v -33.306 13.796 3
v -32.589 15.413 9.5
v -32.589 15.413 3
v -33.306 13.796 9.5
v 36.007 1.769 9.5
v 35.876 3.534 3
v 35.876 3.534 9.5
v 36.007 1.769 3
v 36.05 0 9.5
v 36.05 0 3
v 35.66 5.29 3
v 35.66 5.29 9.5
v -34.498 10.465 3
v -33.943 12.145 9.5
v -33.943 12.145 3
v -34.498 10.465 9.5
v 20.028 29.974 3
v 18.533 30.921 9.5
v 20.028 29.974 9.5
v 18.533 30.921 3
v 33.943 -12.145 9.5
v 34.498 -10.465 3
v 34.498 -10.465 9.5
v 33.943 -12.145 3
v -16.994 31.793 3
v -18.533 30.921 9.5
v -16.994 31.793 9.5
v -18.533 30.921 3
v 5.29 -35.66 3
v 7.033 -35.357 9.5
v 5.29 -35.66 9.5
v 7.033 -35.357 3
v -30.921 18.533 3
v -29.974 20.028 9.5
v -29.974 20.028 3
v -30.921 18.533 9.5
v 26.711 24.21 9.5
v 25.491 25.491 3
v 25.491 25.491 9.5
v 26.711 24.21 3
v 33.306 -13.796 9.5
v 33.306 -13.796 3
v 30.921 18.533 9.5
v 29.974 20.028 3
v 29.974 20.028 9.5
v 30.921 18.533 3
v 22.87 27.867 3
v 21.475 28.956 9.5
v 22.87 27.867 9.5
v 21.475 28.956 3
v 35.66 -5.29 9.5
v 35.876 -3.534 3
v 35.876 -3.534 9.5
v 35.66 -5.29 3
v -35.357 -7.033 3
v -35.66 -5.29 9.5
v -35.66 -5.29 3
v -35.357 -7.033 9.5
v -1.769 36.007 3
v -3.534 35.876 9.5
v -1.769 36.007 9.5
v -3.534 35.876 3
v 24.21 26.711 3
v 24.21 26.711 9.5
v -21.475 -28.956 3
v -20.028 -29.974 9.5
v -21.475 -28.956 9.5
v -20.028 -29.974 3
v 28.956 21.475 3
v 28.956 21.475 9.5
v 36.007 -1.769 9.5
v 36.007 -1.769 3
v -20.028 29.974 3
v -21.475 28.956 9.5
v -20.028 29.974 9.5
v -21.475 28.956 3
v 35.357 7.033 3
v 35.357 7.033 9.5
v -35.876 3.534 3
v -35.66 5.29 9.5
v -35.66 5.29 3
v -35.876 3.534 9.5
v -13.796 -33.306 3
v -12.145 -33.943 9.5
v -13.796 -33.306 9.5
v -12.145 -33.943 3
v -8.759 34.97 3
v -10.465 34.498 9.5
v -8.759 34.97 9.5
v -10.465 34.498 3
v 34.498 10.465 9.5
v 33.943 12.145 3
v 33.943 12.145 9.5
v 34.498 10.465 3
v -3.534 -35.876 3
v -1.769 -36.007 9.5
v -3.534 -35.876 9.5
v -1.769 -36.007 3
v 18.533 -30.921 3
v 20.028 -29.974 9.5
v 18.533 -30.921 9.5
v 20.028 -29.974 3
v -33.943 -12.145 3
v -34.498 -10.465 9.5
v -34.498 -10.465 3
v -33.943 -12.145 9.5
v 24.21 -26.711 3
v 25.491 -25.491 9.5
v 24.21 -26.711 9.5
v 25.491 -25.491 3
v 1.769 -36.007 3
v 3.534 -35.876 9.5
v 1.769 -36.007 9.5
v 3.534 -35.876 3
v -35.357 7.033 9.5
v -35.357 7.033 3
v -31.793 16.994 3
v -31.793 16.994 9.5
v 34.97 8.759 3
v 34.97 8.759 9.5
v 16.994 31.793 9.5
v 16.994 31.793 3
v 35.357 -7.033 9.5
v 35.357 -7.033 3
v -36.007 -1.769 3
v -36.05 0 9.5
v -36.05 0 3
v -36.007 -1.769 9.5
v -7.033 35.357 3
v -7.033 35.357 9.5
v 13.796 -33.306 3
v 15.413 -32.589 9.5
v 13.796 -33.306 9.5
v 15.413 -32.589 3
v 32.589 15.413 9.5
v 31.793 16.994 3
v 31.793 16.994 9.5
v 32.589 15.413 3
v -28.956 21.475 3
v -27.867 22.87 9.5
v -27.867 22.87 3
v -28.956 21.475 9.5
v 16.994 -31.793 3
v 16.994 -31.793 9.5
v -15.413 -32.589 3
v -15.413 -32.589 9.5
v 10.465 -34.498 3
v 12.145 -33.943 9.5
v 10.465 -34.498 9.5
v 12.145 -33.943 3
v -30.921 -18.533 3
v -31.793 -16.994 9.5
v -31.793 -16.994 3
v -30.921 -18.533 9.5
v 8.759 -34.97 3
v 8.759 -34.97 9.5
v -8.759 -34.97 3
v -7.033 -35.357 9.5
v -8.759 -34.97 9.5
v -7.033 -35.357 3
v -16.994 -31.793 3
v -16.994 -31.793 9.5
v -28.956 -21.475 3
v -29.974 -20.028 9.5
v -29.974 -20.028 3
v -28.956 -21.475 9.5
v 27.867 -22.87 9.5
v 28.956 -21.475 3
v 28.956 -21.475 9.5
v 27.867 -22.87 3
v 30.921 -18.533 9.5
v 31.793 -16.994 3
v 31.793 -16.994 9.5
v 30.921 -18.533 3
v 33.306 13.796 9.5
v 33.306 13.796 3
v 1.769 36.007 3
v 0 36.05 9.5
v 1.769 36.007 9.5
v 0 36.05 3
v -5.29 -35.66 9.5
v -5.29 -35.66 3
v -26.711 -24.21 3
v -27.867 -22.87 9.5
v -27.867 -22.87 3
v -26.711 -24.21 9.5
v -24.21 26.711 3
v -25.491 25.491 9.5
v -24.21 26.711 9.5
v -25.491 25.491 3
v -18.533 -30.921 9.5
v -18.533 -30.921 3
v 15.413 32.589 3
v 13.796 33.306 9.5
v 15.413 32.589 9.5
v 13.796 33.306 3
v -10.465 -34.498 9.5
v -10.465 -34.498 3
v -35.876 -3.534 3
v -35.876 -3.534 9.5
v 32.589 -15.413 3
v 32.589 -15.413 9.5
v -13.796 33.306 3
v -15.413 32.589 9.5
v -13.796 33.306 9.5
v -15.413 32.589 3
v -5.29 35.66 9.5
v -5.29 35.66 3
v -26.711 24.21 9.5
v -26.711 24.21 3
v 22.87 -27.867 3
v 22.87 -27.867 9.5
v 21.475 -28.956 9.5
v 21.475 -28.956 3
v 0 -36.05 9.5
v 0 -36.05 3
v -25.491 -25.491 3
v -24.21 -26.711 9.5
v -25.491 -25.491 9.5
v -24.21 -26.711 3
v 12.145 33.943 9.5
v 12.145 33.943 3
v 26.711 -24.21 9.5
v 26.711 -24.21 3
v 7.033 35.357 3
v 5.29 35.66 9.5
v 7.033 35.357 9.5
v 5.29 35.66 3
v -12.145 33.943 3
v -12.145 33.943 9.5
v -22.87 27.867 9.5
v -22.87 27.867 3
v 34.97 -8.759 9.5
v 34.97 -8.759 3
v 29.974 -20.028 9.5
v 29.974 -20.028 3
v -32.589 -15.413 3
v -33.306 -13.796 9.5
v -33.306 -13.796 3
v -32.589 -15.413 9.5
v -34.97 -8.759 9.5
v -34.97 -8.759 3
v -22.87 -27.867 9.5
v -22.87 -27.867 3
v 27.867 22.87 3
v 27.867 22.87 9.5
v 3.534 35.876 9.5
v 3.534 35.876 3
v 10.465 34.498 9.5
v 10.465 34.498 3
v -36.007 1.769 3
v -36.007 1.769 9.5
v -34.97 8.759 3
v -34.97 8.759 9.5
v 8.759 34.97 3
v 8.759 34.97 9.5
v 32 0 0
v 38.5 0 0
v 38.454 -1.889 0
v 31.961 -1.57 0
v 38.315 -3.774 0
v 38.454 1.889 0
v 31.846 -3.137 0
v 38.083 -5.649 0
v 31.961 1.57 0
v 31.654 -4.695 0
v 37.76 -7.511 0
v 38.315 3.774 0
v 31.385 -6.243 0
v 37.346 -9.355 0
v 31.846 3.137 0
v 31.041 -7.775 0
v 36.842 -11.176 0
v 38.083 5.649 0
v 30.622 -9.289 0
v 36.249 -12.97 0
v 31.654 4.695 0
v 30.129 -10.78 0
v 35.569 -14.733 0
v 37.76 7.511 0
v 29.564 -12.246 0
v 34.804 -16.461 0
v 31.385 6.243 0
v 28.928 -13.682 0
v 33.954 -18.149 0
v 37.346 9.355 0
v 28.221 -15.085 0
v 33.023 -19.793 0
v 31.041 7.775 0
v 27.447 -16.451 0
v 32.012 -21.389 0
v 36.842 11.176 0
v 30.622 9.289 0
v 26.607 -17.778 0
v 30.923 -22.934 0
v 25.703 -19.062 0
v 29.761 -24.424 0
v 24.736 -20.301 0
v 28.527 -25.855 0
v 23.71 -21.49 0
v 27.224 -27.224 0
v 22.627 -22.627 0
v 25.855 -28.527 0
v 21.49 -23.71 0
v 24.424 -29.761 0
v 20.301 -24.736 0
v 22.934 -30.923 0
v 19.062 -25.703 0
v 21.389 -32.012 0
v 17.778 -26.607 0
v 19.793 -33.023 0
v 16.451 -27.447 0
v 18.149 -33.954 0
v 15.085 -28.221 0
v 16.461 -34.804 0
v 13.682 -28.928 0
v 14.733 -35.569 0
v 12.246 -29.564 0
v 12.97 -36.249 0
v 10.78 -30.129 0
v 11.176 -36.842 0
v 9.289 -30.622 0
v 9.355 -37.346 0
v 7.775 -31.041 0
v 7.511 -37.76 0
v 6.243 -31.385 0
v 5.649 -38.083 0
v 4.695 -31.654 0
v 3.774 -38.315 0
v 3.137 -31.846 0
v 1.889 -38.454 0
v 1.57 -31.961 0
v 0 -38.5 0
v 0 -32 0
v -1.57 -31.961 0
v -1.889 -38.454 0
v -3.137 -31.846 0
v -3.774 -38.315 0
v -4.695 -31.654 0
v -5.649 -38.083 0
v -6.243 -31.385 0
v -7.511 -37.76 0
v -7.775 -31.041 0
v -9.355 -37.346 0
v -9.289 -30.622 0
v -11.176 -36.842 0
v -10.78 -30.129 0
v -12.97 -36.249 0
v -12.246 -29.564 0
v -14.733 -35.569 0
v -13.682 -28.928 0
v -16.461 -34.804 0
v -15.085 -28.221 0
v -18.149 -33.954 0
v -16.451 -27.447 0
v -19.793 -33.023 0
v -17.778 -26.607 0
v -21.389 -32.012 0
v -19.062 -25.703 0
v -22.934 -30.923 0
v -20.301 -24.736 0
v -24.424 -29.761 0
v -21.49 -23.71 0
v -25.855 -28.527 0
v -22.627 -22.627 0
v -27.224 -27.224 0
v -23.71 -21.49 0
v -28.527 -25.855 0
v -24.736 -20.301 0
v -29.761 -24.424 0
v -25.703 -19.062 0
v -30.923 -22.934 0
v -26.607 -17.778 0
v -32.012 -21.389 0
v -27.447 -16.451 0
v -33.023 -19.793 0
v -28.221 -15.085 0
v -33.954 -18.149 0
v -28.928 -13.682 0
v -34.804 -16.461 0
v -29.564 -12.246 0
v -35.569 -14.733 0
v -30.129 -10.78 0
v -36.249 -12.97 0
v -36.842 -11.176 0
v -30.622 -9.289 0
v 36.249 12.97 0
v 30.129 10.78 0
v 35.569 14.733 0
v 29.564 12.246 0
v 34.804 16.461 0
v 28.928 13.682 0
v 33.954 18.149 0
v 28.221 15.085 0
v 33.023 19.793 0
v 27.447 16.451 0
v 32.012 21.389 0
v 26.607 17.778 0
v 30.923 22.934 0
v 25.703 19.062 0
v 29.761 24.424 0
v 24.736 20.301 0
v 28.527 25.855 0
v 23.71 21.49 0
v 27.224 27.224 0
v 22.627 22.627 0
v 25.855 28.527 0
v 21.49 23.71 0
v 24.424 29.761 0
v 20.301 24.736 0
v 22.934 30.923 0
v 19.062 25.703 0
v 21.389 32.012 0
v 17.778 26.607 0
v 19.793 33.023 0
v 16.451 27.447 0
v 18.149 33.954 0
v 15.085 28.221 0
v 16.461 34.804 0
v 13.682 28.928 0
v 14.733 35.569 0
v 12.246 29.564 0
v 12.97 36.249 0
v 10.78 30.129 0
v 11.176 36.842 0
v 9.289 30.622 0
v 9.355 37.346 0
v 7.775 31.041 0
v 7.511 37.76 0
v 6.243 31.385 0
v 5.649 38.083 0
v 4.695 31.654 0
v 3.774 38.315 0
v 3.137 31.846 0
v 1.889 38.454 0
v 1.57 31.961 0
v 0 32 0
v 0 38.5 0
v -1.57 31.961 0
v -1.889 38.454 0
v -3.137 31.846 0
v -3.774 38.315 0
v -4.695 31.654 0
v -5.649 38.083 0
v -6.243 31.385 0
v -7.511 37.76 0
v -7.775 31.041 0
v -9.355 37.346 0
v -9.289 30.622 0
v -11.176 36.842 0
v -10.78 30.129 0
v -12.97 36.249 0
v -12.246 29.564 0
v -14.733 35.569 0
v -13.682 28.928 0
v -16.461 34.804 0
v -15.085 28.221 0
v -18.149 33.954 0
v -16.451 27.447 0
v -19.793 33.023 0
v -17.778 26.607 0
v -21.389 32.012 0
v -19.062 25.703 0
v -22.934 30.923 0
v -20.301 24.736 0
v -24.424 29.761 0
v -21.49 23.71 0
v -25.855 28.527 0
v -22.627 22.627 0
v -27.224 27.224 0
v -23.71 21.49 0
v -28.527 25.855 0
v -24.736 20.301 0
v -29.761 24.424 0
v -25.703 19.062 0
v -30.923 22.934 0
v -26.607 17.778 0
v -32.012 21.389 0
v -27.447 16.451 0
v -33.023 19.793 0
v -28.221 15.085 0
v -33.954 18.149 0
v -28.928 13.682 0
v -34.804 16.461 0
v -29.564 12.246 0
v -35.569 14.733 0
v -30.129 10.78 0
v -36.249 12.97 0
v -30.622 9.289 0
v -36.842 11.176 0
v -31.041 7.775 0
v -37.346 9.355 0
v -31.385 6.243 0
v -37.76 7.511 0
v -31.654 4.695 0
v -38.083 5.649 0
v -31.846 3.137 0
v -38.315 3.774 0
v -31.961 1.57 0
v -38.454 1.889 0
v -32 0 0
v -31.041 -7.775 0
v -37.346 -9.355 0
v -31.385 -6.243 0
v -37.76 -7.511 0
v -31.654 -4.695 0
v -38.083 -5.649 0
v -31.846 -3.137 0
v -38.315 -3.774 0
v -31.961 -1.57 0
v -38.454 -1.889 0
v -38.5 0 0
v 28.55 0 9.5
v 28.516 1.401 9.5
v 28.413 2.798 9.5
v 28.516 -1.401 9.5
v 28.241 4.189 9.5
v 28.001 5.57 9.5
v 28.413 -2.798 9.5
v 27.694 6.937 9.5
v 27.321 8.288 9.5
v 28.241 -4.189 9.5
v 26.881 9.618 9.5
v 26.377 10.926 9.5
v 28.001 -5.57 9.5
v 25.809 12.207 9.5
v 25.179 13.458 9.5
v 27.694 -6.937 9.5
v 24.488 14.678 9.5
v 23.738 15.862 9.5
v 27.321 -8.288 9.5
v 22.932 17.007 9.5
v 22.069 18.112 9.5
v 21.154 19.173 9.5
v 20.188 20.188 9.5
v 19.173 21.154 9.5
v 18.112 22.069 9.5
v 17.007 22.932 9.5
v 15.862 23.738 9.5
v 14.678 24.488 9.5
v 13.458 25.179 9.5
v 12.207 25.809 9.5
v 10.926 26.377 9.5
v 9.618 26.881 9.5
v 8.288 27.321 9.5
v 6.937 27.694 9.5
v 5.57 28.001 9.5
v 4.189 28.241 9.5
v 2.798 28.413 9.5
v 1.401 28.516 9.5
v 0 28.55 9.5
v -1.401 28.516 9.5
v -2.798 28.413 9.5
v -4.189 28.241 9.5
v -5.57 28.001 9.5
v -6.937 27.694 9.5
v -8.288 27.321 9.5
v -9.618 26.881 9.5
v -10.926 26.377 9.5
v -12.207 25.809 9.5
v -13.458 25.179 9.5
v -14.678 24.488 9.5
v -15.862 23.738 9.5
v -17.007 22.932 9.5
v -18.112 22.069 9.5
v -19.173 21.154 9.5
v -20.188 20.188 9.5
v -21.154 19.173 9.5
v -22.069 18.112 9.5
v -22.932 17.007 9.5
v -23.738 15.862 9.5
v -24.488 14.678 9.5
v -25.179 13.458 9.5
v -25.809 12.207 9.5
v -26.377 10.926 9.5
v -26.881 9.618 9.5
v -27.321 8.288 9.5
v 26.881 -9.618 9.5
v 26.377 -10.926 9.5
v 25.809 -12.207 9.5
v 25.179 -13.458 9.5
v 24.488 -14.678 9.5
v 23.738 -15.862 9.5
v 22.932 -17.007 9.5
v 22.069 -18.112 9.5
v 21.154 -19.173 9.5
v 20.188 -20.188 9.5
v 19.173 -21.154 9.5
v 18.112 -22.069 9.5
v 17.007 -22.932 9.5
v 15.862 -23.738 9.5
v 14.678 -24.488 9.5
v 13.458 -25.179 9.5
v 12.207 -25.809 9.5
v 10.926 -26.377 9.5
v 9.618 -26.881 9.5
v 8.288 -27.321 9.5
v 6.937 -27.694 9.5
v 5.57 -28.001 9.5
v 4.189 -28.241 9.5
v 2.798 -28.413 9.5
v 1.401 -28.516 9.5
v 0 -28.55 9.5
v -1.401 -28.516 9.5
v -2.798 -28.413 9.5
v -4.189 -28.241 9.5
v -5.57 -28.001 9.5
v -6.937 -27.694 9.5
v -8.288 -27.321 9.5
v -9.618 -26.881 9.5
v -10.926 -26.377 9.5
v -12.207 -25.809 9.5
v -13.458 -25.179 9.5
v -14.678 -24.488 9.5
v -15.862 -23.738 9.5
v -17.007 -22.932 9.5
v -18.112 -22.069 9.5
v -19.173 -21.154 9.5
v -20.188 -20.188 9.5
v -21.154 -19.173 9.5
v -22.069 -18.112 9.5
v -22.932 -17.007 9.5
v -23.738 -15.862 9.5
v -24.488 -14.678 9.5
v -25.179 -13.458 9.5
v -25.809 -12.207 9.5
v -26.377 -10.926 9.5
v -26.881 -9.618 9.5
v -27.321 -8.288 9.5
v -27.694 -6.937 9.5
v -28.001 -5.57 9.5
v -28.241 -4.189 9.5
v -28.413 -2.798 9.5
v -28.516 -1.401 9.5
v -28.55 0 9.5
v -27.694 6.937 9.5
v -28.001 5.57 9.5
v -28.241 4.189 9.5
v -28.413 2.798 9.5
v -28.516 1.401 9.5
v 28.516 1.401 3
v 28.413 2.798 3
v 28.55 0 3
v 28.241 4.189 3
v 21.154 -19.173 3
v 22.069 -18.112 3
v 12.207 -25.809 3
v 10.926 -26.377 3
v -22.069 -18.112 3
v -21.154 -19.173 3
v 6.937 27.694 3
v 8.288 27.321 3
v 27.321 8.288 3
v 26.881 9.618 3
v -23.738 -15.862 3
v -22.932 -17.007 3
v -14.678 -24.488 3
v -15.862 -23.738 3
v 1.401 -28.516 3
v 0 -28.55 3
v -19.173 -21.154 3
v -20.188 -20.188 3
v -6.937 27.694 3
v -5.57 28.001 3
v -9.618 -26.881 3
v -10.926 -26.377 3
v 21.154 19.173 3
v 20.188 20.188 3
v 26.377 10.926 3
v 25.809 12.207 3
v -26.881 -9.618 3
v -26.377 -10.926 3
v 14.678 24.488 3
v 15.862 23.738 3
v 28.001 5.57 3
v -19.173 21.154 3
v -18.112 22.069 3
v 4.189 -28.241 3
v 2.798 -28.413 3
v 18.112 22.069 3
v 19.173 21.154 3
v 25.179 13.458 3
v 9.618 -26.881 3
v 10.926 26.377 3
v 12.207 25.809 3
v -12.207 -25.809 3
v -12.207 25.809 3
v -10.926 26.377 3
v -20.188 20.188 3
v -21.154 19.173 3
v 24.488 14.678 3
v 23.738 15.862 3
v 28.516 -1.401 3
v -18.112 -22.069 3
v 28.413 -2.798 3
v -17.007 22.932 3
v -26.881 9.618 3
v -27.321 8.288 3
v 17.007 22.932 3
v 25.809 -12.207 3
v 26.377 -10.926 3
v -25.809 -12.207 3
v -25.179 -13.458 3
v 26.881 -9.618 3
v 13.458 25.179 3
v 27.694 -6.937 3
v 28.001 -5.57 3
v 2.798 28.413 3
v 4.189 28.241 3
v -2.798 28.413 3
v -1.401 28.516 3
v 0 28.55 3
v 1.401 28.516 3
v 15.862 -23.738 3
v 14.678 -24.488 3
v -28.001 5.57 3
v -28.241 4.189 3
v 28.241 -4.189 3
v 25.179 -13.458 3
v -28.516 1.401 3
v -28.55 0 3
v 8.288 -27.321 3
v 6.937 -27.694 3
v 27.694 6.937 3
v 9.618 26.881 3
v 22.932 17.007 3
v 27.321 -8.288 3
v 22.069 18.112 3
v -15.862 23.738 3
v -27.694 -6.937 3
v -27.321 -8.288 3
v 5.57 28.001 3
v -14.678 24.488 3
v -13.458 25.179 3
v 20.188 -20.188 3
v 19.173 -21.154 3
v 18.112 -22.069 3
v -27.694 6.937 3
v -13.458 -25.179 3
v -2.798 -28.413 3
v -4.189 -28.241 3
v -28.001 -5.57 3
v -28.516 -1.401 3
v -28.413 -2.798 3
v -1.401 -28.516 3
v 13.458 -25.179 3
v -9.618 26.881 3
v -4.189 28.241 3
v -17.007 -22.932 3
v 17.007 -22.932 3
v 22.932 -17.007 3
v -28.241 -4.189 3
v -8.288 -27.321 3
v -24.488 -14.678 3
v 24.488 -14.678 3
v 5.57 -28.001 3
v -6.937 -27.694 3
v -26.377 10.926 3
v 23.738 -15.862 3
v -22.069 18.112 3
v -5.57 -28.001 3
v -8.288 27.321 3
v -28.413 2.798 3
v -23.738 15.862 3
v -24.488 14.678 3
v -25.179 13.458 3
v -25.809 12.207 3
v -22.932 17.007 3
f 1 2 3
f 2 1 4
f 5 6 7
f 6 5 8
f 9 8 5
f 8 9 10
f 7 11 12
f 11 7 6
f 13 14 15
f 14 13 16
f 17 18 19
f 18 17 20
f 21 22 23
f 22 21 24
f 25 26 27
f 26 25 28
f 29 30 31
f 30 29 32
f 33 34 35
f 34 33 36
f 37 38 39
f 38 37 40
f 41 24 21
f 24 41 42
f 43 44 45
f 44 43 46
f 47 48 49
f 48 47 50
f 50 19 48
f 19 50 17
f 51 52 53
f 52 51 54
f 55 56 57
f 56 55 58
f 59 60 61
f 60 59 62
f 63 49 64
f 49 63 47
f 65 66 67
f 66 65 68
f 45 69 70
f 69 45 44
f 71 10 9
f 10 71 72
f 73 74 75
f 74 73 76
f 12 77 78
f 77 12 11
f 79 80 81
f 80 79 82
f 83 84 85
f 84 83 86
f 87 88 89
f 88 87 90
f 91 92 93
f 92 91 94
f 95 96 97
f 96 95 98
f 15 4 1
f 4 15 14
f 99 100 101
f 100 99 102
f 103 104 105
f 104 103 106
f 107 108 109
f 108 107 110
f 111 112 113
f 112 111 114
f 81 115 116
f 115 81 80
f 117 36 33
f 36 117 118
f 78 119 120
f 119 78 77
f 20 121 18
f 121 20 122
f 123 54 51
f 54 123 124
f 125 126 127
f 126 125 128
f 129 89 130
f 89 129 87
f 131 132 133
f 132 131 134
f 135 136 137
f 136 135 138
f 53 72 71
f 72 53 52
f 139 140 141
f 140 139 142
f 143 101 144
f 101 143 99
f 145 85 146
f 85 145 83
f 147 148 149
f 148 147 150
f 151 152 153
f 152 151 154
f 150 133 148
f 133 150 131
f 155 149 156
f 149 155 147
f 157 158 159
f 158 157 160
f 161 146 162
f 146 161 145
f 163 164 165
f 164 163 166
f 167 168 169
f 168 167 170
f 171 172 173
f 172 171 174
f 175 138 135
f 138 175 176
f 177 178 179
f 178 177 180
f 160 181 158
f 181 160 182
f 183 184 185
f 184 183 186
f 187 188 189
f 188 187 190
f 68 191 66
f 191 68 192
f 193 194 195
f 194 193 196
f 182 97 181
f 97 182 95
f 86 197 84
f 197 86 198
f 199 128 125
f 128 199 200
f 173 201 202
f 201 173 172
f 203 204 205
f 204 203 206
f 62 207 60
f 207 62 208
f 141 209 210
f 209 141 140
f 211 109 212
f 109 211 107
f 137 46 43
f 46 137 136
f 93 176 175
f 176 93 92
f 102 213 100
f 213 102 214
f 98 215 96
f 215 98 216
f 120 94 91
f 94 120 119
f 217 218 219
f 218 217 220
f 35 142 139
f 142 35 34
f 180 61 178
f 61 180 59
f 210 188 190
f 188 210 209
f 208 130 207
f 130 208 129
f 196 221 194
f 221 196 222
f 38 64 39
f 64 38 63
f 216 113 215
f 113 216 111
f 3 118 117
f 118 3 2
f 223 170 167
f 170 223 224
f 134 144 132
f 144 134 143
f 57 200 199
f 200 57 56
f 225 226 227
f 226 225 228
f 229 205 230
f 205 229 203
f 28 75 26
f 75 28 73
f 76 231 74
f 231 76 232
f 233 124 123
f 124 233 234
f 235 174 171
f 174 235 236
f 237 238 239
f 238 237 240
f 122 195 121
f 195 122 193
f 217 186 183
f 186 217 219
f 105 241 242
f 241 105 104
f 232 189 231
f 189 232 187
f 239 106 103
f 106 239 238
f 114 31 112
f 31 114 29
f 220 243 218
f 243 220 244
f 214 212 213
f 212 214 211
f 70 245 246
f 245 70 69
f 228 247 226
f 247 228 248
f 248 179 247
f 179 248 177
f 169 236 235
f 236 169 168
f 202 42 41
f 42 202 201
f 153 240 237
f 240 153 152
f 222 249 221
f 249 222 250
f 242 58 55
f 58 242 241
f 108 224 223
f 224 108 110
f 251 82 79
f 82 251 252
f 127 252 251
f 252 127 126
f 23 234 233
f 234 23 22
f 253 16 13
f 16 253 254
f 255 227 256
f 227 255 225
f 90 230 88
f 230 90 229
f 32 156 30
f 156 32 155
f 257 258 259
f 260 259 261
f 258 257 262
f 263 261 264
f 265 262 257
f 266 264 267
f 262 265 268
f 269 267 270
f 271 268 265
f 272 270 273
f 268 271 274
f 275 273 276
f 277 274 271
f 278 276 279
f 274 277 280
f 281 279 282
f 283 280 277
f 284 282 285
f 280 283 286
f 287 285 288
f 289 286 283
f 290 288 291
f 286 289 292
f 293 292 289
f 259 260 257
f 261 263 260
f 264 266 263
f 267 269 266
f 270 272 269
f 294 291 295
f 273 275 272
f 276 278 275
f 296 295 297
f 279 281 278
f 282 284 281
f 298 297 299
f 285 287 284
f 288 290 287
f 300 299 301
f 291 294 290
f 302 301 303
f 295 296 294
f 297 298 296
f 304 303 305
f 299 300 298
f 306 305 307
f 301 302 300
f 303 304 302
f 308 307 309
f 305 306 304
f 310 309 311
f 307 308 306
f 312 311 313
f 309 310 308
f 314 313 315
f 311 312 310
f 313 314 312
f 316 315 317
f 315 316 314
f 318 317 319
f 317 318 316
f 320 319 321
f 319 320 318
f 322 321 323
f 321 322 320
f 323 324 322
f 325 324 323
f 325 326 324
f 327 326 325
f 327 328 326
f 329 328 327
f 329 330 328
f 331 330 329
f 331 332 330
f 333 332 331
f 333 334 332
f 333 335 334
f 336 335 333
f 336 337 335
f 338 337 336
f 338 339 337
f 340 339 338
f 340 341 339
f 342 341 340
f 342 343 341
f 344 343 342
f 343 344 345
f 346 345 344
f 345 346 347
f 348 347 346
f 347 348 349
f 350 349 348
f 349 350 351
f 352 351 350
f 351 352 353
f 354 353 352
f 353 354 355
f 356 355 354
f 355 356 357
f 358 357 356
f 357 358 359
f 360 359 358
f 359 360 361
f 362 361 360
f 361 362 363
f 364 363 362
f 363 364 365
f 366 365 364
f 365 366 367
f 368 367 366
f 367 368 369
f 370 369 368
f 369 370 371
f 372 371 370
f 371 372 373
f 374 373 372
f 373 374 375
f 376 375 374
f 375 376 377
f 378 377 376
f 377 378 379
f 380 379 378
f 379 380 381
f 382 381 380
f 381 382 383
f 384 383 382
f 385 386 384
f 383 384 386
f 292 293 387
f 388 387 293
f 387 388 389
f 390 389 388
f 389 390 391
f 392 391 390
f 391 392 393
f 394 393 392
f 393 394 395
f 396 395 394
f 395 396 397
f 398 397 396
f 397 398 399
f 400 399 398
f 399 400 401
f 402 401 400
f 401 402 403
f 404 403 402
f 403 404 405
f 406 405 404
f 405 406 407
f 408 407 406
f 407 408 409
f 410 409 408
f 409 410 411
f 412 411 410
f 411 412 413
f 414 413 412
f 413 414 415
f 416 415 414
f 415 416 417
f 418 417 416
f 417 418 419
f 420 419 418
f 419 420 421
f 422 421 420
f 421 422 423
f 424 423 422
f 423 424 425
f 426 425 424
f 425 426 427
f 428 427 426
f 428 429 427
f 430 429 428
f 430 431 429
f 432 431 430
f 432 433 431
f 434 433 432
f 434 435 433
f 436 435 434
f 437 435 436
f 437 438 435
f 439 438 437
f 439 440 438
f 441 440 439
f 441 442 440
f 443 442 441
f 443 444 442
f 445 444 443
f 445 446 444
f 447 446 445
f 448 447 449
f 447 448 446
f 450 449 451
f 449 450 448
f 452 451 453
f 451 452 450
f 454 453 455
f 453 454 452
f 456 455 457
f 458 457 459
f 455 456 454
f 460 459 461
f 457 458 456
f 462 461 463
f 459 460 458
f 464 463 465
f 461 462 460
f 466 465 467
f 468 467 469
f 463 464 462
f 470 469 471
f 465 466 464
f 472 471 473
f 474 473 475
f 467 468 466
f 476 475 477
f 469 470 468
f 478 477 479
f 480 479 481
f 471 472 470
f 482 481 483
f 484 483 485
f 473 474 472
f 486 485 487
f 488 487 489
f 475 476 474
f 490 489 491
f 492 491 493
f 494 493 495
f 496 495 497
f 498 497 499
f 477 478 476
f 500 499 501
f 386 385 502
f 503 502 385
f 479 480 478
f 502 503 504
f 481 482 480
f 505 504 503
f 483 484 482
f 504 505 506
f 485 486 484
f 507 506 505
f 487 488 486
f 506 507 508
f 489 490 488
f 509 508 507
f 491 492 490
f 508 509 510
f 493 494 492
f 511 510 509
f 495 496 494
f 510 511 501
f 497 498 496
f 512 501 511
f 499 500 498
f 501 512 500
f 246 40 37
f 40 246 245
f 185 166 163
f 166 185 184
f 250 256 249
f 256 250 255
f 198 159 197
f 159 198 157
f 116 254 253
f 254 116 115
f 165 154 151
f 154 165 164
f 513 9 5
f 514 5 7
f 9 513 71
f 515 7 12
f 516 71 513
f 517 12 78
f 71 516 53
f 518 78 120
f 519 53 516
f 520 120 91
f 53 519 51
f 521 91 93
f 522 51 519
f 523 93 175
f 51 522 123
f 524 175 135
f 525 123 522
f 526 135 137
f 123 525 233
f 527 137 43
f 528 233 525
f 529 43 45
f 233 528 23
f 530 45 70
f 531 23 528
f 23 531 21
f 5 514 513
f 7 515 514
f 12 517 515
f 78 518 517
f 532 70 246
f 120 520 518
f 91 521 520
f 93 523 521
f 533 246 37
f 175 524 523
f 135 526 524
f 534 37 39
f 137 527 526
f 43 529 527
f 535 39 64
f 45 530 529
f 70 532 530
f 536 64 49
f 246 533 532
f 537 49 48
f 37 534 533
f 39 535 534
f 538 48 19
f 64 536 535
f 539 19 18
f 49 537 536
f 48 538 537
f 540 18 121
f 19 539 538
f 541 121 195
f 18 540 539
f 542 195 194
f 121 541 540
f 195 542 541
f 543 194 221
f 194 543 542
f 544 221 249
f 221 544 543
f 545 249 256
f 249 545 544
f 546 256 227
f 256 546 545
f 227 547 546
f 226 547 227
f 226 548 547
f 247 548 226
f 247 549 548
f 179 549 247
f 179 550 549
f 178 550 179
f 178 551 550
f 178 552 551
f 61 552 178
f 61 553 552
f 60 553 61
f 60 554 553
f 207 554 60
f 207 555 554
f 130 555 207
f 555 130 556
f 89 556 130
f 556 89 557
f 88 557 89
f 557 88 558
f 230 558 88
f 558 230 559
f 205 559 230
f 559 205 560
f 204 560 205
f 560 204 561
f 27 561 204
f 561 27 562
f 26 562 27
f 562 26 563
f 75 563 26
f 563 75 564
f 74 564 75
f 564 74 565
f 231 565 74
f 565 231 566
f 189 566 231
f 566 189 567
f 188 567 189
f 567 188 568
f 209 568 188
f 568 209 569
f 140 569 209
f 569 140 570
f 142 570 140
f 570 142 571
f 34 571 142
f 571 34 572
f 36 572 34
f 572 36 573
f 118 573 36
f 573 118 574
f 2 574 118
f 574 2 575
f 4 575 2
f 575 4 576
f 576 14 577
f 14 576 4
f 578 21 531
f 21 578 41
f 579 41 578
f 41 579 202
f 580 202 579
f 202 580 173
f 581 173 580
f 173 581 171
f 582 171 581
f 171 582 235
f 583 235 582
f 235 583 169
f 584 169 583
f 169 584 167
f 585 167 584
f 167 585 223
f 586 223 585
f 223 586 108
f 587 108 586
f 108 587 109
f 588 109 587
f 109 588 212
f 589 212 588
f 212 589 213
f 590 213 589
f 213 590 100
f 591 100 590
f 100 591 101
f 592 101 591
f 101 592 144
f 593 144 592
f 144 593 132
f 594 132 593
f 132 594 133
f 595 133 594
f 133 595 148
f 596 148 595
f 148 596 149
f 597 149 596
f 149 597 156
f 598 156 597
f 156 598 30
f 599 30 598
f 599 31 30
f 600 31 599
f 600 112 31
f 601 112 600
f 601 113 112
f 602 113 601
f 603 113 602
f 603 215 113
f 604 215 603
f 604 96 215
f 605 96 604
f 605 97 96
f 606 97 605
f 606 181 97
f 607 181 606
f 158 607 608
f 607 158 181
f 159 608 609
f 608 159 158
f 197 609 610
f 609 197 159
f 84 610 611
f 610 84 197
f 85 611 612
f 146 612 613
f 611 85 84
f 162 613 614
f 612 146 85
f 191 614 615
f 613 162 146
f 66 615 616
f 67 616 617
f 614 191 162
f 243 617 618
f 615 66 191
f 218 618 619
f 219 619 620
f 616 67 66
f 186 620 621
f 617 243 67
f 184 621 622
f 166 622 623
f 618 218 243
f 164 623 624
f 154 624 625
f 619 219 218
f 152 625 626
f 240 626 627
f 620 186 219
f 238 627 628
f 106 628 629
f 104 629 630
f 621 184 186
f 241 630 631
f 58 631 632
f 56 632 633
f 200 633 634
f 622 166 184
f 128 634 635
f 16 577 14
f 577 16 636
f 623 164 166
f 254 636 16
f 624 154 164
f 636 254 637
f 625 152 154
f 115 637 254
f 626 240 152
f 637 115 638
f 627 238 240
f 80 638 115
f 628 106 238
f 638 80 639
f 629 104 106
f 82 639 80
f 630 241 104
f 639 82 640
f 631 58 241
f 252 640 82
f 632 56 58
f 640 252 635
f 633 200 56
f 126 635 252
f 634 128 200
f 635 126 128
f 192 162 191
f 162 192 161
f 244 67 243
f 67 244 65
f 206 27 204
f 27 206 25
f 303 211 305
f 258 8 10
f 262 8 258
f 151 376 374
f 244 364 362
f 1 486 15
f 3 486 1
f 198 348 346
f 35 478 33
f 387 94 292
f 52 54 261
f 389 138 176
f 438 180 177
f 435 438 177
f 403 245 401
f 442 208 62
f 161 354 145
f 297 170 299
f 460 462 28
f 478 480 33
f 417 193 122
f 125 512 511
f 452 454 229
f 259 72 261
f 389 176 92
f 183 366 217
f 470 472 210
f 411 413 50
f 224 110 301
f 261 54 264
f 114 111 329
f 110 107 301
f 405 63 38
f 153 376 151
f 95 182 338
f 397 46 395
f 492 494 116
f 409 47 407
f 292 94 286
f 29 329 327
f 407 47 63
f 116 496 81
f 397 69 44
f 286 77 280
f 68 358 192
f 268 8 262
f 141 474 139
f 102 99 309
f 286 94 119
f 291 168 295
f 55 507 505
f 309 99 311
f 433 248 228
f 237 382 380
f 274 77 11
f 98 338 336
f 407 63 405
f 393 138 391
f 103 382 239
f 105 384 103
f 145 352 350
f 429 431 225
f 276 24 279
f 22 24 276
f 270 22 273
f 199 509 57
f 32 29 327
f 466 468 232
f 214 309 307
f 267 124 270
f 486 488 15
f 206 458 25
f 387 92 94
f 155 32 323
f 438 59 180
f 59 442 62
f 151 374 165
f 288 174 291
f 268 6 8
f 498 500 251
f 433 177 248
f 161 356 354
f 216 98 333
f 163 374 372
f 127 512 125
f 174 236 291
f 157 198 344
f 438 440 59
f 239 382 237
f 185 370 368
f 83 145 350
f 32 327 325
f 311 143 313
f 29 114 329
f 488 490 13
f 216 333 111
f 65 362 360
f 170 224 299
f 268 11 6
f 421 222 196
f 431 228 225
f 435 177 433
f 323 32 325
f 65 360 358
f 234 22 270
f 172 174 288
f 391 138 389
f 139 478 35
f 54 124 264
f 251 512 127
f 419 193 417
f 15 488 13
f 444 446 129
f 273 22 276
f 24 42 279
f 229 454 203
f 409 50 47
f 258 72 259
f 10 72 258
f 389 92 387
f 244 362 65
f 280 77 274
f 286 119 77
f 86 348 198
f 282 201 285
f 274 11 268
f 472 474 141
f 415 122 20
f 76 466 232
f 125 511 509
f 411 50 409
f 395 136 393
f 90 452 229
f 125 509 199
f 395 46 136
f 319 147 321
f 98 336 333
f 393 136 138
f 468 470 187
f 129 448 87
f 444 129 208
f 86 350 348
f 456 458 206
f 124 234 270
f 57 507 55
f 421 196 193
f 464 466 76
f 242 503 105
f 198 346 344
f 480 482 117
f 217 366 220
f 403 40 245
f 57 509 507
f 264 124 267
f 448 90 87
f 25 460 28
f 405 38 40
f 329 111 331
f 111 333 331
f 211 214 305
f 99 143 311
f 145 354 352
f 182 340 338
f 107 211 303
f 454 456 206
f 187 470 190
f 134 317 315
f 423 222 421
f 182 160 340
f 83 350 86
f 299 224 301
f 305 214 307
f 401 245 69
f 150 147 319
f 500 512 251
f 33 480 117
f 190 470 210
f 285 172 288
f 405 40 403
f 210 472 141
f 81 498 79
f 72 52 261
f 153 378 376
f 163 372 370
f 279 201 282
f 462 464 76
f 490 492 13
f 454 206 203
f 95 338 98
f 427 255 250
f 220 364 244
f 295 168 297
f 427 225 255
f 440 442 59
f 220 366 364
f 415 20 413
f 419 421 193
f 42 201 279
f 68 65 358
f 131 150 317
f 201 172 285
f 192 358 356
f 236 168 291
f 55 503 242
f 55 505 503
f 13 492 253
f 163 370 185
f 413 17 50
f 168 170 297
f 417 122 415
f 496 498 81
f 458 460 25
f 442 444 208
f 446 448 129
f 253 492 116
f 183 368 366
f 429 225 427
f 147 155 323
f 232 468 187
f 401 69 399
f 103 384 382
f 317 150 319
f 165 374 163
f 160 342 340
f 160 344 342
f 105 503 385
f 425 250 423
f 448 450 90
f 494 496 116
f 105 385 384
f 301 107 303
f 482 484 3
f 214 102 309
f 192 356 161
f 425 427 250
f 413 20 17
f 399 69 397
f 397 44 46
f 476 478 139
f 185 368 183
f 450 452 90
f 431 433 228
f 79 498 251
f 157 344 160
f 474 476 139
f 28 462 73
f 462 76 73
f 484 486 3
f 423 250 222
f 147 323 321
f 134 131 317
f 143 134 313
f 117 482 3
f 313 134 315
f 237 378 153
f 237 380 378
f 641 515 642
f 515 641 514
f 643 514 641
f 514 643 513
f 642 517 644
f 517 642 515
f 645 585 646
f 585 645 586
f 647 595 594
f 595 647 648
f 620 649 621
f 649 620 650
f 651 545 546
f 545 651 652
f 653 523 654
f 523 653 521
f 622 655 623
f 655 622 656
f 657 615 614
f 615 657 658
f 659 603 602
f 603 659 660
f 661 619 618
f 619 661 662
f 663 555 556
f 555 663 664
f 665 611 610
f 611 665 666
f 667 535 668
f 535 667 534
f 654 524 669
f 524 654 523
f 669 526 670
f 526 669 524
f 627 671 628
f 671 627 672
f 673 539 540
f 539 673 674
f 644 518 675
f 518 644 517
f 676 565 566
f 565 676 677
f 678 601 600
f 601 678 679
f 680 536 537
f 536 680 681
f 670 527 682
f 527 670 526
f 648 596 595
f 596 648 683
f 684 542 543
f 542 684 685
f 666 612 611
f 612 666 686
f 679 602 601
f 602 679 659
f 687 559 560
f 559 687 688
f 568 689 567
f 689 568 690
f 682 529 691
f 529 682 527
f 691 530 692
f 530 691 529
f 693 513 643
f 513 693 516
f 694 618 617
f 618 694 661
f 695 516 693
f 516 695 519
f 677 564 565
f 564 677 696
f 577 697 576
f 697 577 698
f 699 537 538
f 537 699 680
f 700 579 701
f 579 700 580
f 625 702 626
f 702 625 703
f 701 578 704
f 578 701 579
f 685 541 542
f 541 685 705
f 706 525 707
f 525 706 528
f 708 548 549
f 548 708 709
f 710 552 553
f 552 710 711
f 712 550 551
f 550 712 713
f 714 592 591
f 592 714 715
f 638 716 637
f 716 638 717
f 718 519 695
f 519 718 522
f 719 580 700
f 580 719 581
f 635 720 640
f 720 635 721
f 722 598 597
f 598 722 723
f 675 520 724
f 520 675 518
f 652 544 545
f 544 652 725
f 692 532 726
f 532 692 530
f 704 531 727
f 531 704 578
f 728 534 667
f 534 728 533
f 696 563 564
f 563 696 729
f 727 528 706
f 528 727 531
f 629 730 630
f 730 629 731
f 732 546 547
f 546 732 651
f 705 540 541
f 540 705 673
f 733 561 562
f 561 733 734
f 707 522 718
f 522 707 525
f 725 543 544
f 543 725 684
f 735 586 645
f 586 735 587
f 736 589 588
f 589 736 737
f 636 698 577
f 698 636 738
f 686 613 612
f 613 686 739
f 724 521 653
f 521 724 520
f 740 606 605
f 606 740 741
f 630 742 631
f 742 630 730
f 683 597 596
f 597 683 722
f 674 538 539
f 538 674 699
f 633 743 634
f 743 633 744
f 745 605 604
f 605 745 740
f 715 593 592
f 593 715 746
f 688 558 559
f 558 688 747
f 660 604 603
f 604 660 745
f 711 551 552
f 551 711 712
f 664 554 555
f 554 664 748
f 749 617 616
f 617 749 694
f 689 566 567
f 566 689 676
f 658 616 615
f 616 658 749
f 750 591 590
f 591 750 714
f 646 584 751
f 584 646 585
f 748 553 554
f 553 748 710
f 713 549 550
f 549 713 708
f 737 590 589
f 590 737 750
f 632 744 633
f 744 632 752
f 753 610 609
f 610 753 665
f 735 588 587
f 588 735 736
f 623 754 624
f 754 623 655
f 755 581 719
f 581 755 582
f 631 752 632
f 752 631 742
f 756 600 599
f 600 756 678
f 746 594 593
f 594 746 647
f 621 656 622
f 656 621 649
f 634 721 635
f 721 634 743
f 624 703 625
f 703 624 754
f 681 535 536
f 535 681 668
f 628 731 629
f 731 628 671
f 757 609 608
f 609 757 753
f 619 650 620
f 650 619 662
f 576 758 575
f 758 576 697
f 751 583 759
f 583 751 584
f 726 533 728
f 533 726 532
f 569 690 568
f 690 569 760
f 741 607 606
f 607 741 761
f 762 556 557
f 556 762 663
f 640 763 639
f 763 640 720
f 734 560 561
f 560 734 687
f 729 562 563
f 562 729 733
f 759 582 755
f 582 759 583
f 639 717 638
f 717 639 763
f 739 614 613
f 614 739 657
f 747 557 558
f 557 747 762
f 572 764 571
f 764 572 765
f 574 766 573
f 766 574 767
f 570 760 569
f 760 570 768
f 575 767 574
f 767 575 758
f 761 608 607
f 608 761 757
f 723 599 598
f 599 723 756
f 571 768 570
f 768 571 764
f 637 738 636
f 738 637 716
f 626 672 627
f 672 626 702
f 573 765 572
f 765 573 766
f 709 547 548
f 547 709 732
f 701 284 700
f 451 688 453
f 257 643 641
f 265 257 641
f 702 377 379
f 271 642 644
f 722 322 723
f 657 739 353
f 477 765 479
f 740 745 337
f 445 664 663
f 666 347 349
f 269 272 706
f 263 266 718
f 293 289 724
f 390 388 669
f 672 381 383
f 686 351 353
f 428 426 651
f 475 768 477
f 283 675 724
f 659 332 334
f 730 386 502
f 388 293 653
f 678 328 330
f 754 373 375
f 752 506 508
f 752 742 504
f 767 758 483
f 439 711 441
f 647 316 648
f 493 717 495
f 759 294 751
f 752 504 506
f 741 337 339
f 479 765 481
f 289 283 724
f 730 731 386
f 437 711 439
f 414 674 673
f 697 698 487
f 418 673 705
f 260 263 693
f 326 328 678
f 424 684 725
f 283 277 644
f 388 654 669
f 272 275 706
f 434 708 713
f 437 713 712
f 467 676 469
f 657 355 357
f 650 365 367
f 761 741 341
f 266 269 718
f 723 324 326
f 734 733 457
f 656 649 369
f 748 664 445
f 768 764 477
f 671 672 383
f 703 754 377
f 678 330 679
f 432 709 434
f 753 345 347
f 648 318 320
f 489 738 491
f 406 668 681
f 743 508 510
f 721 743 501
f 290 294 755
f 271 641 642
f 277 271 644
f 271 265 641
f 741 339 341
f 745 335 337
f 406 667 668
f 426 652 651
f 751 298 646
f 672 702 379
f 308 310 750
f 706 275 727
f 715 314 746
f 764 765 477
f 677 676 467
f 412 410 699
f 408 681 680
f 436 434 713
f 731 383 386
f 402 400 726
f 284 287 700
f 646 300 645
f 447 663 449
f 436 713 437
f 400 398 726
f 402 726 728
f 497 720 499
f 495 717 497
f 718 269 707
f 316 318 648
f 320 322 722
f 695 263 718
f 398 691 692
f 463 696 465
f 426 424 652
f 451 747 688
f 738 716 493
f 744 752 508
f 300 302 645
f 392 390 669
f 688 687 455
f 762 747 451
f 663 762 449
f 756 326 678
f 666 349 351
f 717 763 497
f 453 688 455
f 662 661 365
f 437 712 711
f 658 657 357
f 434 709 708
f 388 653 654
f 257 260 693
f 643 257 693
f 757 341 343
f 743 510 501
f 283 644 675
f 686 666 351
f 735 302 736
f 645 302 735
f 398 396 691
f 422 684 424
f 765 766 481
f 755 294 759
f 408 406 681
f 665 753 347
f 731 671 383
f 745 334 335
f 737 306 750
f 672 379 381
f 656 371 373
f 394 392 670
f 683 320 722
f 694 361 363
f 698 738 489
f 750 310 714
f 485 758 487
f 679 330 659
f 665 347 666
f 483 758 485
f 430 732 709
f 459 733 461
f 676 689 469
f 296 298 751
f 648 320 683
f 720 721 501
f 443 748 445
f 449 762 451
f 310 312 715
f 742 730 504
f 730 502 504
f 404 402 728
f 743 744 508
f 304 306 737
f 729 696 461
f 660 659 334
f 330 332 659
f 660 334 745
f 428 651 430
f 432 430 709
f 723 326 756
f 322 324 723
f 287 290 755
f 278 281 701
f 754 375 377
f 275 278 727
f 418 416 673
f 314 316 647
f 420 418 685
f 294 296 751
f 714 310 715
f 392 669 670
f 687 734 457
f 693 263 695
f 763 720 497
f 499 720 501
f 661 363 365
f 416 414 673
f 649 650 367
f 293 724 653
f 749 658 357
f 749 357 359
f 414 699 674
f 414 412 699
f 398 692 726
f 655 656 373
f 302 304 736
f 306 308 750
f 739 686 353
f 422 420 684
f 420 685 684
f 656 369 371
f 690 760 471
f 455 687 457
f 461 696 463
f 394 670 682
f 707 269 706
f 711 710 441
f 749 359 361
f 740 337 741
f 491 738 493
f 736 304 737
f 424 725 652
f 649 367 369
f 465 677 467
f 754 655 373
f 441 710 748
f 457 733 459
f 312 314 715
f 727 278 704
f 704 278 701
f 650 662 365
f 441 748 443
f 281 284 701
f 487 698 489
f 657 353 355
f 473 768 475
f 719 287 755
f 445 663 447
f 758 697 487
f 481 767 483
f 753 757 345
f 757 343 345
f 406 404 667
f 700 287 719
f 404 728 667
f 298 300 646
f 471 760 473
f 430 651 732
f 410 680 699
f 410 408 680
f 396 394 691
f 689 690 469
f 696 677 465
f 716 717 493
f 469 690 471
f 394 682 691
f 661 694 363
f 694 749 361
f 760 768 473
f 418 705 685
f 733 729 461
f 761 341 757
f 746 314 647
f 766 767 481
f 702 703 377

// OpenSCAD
// Outer Diameter
    OD = 72.1;
// Inner Diameter
    ID = 57.1;
// Taper's Outer Diameter
    Taper_OD = 77;
// Taper's Inner Diameter
    Taper_InnerD = 64;
// Overall Thickness
    Thickness = 9.5;
// Taper Thickness
    Taper_Thickness = 3;


module WheelSpacer (OD, ID, Taper_OD, Taper_InnerD, Thickness, Taper_Thickness)
{
difference()
{
	union()
	{
		cylinder(h = Thickness, r = OD/2, $fn= 128);
		cylinder(h = Taper_Thickness, r1 = Taper_OD/2, r2= OD/2, $fn = 128);
	}
	translate([0,0,-0.5]) cylinder(h = Thickness+1, r = ID/2, $fn = 128);
	cylinder(h = Taper_Thickness, r1 = Taper_InnerD/2, r2 = ID/2, $fn = 128);
}


}







WheelSpacer(OD, ID, Taper_OD, Taper_InnerD, Thickness, Taper_Thickness);
